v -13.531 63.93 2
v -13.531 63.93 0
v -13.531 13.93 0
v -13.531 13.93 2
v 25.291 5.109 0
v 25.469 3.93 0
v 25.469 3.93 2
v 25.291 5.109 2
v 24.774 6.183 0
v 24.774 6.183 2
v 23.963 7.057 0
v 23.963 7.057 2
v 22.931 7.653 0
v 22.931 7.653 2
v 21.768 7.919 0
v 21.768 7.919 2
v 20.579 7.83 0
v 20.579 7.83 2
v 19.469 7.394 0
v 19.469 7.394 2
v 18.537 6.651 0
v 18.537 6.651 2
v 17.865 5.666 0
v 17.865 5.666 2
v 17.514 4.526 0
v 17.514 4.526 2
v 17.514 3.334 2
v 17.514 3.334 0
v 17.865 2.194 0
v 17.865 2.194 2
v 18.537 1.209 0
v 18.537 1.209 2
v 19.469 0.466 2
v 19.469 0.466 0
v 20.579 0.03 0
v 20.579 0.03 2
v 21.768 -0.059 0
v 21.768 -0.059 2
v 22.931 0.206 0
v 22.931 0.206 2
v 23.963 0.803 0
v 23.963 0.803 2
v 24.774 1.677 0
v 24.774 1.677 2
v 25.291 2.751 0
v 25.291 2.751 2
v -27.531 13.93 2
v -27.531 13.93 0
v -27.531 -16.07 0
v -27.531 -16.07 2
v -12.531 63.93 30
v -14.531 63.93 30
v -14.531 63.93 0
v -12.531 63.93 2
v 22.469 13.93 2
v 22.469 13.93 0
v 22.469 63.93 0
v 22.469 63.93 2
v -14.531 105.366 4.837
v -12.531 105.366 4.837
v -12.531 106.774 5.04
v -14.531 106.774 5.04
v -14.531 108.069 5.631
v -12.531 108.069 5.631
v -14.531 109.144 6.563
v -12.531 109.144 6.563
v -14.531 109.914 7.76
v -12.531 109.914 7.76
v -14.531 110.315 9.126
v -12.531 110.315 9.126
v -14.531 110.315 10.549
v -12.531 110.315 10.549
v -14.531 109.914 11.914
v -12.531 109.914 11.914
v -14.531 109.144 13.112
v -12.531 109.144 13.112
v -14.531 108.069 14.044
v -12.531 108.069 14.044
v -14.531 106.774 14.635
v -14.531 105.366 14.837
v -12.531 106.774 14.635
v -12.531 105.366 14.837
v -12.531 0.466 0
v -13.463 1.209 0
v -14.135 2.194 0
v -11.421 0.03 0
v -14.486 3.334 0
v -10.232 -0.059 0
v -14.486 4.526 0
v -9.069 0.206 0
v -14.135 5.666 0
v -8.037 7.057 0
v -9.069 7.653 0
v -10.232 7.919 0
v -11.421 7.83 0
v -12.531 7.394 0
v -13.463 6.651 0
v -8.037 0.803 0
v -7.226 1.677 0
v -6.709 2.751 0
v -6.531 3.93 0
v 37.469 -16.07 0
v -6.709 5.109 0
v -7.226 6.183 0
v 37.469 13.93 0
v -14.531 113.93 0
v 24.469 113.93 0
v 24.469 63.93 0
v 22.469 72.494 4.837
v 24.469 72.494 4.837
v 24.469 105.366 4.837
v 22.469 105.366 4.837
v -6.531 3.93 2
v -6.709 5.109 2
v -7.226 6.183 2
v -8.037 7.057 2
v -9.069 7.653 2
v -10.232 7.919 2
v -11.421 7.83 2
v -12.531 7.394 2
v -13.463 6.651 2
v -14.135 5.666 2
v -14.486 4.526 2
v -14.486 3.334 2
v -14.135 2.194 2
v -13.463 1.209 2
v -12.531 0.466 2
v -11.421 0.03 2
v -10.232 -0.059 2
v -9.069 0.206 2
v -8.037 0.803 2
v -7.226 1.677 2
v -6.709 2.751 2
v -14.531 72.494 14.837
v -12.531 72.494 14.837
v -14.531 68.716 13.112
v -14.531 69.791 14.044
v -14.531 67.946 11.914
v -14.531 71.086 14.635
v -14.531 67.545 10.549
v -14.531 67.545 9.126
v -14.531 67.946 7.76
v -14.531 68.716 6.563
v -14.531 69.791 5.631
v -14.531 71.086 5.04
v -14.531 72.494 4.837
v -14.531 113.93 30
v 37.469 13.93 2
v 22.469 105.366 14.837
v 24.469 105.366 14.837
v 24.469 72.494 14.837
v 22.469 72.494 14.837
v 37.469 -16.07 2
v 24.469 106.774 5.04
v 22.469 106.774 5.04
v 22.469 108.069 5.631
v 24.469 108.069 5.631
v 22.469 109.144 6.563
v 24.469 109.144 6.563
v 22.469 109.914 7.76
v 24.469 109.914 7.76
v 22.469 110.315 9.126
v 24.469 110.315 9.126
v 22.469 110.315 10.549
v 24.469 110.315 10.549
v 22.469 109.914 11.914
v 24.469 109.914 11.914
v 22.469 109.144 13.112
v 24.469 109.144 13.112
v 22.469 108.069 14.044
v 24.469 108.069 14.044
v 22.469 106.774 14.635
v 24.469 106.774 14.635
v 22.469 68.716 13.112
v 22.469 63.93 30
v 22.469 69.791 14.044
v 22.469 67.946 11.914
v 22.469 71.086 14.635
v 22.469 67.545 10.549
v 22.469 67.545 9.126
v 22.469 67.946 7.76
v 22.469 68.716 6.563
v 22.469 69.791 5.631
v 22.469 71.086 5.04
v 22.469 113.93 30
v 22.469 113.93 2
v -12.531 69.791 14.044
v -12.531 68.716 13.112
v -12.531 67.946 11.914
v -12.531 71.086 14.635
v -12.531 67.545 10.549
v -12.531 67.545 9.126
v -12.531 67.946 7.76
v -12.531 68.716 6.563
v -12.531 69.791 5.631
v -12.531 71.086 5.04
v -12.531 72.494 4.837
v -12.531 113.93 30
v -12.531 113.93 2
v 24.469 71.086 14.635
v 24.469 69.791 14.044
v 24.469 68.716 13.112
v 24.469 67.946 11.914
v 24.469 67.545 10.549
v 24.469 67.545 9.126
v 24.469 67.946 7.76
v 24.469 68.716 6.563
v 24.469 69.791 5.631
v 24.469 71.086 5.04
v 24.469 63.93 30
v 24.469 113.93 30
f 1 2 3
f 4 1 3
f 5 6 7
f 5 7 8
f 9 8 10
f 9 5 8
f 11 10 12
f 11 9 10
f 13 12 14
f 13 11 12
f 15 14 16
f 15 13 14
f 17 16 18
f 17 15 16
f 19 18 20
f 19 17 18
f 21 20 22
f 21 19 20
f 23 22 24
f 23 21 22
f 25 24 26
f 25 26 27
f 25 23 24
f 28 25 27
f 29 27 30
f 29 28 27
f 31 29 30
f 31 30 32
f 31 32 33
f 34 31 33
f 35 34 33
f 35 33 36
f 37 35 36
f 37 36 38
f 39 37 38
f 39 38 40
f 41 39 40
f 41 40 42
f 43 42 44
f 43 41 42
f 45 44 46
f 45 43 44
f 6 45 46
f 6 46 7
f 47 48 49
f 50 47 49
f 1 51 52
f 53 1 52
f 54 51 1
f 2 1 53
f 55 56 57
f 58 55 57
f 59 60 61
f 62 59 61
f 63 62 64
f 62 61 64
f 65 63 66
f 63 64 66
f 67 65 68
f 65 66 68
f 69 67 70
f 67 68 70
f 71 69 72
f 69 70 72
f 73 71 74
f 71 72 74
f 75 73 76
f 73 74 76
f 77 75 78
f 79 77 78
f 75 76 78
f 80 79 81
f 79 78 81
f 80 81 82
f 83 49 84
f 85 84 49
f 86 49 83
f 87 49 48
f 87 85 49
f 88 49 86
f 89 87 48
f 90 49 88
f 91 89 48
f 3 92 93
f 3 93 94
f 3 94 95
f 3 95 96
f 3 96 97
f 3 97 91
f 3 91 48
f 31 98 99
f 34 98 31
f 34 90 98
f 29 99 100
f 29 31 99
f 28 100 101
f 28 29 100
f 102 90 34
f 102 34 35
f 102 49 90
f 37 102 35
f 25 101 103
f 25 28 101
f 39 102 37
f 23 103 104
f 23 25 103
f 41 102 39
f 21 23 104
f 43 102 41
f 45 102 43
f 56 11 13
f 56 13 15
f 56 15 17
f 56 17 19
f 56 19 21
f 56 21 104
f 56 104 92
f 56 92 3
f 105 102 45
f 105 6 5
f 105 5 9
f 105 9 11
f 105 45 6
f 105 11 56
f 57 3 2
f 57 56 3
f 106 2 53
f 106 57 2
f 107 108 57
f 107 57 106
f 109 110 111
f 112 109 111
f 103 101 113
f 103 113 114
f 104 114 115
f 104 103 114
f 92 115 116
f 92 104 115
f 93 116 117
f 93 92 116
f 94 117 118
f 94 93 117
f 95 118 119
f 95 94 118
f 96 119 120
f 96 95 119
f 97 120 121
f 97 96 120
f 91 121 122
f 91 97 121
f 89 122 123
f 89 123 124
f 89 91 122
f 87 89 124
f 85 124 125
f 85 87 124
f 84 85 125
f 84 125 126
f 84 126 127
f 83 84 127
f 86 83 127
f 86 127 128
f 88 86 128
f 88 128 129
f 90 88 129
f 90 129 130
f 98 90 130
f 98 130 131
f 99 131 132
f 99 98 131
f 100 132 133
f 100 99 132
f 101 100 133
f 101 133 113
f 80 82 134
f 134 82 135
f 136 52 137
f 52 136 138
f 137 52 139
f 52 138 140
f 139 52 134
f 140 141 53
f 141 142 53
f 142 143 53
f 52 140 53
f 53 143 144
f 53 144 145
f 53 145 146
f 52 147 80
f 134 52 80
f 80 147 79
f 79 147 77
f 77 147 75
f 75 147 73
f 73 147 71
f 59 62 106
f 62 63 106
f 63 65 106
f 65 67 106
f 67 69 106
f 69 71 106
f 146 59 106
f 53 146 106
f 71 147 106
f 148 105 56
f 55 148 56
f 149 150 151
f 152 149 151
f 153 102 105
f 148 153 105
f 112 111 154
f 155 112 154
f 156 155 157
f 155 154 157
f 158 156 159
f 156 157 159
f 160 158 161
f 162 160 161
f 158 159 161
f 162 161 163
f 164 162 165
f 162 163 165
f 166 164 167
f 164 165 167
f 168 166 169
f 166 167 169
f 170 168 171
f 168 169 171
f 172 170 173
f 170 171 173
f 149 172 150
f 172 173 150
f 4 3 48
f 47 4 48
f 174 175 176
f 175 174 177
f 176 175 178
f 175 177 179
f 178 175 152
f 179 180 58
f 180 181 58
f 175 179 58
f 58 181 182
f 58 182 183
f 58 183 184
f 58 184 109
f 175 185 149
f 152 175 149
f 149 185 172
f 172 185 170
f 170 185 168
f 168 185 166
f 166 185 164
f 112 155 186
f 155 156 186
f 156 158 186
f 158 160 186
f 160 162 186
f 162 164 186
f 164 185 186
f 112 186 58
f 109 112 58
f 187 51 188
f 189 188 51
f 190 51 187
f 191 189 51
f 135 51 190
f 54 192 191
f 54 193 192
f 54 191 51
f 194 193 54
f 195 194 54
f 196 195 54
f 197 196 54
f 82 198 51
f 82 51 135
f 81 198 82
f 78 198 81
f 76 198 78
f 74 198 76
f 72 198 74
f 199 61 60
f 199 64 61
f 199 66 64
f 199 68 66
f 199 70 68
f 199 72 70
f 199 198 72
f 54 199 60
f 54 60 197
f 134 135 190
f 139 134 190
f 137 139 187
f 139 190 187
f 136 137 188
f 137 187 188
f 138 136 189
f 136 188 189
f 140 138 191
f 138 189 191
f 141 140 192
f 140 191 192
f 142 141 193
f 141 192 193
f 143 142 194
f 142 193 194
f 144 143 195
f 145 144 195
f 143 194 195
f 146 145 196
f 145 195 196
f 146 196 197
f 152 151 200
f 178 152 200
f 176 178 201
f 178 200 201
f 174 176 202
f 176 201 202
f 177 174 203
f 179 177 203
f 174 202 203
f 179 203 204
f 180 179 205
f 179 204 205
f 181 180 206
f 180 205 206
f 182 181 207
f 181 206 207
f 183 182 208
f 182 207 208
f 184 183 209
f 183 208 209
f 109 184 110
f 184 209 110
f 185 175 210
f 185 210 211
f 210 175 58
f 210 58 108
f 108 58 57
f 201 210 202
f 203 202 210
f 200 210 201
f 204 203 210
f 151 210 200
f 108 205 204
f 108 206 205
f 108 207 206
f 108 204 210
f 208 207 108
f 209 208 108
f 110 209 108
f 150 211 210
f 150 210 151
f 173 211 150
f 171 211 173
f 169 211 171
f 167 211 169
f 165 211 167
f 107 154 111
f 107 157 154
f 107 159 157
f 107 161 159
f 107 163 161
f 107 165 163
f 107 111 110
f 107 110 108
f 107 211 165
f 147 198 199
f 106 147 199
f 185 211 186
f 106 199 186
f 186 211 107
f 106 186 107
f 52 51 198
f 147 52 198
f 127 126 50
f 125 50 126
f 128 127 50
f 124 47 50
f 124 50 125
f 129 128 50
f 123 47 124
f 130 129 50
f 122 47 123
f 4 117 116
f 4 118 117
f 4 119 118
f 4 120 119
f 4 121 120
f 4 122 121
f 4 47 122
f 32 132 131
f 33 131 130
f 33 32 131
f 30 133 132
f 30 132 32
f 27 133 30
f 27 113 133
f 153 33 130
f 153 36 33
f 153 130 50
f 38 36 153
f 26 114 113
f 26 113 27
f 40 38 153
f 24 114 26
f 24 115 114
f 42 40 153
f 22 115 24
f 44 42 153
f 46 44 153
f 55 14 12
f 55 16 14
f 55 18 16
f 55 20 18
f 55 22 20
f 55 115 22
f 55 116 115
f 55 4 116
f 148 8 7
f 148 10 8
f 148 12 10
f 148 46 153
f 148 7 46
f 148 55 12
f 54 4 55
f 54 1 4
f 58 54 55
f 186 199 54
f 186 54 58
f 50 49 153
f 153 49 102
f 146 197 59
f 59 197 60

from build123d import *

# Parameters (mm, degrees)
SKETCH_1_R          = 4
EXTRUDE_1_DEPTH     = 2
SKETCH_2_W          = 30
SKETCH_2_H          = 50
EXTRUDE_2_DEPTH     = 2
CUT_EXTRUDE_1_DEPTH = 55


with BuildPart() as part:
    # 草图1 → 凸台-拉伸1 (new body)
    with BuildSketch(Plane.XY):
        Polygon((-27.530821095, -16.070026793), (37.469178905, -16.070026793), (37.469178905, 13.929973207), (22.469178905, 13.929973207), (22.469178905, 113.929973207), (-13.530821095, 113.929973207), (-13.530821095, 13.929973207), (-27.530821095, 13.929973207), align=None)
        with Locations((21.469178905, 3.929973207)):
            Circle(SKETCH_1_R, mode=Mode.SUBTRACT)
        with Locations((-10.530821095, 3.929973207)):
            Circle(SKETCH_1_R, mode=Mode.SUBTRACT)
    extrude(amount=EXTRUDE_1_DEPTH)

    # 草图2 → 凸台-拉伸2 (add)
    with BuildSketch(Plane(origin=(22.469178905, 0, 0), x_dir=(0, 0, -1), z_dir=(1, 0, 0))):
        with Locations((-15, 88.929973207)):
            Rectangle(SKETCH_2_W, SKETCH_2_H)
    extrude_2 = extrude(amount=EXTRUDE_2_DEPTH)

    # 镜向1: 凸台-拉伸2 across plane
    add(extrude_2.mirror(Plane(origin=(4.969178905, 0, 0), x_dir=(0, 0, 1), z_dir=(1, 0, 0))))

    # 草图3 → 切除-拉伸1 (cut)
    with BuildSketch(Plane(origin=(24.469178905, 0, 0), x_dir=(0, 0, -1), z_dir=(1, 0, 0))):
        with BuildLine():
            Line((-14.837360519, 105.36567793), (-14.837360519, 72.494268484))
            ThreePointArc((-14.837360519, 72.494268484), (-9.837360519, 67.494268484), (-4.837360519, 72.494268484))
            Line((-4.837360519, 72.494268484), (-4.837360519, 105.36567793))
            ThreePointArc((-4.837360519, 105.36567793), (-9.837360519, 110.36567793), (-14.837360519, 105.36567793))
        make_face()
    extrude(amount=-CUT_EXTRUDE_1_DEPTH, mode=Mode.SUBTRACT)


solid = part.part
